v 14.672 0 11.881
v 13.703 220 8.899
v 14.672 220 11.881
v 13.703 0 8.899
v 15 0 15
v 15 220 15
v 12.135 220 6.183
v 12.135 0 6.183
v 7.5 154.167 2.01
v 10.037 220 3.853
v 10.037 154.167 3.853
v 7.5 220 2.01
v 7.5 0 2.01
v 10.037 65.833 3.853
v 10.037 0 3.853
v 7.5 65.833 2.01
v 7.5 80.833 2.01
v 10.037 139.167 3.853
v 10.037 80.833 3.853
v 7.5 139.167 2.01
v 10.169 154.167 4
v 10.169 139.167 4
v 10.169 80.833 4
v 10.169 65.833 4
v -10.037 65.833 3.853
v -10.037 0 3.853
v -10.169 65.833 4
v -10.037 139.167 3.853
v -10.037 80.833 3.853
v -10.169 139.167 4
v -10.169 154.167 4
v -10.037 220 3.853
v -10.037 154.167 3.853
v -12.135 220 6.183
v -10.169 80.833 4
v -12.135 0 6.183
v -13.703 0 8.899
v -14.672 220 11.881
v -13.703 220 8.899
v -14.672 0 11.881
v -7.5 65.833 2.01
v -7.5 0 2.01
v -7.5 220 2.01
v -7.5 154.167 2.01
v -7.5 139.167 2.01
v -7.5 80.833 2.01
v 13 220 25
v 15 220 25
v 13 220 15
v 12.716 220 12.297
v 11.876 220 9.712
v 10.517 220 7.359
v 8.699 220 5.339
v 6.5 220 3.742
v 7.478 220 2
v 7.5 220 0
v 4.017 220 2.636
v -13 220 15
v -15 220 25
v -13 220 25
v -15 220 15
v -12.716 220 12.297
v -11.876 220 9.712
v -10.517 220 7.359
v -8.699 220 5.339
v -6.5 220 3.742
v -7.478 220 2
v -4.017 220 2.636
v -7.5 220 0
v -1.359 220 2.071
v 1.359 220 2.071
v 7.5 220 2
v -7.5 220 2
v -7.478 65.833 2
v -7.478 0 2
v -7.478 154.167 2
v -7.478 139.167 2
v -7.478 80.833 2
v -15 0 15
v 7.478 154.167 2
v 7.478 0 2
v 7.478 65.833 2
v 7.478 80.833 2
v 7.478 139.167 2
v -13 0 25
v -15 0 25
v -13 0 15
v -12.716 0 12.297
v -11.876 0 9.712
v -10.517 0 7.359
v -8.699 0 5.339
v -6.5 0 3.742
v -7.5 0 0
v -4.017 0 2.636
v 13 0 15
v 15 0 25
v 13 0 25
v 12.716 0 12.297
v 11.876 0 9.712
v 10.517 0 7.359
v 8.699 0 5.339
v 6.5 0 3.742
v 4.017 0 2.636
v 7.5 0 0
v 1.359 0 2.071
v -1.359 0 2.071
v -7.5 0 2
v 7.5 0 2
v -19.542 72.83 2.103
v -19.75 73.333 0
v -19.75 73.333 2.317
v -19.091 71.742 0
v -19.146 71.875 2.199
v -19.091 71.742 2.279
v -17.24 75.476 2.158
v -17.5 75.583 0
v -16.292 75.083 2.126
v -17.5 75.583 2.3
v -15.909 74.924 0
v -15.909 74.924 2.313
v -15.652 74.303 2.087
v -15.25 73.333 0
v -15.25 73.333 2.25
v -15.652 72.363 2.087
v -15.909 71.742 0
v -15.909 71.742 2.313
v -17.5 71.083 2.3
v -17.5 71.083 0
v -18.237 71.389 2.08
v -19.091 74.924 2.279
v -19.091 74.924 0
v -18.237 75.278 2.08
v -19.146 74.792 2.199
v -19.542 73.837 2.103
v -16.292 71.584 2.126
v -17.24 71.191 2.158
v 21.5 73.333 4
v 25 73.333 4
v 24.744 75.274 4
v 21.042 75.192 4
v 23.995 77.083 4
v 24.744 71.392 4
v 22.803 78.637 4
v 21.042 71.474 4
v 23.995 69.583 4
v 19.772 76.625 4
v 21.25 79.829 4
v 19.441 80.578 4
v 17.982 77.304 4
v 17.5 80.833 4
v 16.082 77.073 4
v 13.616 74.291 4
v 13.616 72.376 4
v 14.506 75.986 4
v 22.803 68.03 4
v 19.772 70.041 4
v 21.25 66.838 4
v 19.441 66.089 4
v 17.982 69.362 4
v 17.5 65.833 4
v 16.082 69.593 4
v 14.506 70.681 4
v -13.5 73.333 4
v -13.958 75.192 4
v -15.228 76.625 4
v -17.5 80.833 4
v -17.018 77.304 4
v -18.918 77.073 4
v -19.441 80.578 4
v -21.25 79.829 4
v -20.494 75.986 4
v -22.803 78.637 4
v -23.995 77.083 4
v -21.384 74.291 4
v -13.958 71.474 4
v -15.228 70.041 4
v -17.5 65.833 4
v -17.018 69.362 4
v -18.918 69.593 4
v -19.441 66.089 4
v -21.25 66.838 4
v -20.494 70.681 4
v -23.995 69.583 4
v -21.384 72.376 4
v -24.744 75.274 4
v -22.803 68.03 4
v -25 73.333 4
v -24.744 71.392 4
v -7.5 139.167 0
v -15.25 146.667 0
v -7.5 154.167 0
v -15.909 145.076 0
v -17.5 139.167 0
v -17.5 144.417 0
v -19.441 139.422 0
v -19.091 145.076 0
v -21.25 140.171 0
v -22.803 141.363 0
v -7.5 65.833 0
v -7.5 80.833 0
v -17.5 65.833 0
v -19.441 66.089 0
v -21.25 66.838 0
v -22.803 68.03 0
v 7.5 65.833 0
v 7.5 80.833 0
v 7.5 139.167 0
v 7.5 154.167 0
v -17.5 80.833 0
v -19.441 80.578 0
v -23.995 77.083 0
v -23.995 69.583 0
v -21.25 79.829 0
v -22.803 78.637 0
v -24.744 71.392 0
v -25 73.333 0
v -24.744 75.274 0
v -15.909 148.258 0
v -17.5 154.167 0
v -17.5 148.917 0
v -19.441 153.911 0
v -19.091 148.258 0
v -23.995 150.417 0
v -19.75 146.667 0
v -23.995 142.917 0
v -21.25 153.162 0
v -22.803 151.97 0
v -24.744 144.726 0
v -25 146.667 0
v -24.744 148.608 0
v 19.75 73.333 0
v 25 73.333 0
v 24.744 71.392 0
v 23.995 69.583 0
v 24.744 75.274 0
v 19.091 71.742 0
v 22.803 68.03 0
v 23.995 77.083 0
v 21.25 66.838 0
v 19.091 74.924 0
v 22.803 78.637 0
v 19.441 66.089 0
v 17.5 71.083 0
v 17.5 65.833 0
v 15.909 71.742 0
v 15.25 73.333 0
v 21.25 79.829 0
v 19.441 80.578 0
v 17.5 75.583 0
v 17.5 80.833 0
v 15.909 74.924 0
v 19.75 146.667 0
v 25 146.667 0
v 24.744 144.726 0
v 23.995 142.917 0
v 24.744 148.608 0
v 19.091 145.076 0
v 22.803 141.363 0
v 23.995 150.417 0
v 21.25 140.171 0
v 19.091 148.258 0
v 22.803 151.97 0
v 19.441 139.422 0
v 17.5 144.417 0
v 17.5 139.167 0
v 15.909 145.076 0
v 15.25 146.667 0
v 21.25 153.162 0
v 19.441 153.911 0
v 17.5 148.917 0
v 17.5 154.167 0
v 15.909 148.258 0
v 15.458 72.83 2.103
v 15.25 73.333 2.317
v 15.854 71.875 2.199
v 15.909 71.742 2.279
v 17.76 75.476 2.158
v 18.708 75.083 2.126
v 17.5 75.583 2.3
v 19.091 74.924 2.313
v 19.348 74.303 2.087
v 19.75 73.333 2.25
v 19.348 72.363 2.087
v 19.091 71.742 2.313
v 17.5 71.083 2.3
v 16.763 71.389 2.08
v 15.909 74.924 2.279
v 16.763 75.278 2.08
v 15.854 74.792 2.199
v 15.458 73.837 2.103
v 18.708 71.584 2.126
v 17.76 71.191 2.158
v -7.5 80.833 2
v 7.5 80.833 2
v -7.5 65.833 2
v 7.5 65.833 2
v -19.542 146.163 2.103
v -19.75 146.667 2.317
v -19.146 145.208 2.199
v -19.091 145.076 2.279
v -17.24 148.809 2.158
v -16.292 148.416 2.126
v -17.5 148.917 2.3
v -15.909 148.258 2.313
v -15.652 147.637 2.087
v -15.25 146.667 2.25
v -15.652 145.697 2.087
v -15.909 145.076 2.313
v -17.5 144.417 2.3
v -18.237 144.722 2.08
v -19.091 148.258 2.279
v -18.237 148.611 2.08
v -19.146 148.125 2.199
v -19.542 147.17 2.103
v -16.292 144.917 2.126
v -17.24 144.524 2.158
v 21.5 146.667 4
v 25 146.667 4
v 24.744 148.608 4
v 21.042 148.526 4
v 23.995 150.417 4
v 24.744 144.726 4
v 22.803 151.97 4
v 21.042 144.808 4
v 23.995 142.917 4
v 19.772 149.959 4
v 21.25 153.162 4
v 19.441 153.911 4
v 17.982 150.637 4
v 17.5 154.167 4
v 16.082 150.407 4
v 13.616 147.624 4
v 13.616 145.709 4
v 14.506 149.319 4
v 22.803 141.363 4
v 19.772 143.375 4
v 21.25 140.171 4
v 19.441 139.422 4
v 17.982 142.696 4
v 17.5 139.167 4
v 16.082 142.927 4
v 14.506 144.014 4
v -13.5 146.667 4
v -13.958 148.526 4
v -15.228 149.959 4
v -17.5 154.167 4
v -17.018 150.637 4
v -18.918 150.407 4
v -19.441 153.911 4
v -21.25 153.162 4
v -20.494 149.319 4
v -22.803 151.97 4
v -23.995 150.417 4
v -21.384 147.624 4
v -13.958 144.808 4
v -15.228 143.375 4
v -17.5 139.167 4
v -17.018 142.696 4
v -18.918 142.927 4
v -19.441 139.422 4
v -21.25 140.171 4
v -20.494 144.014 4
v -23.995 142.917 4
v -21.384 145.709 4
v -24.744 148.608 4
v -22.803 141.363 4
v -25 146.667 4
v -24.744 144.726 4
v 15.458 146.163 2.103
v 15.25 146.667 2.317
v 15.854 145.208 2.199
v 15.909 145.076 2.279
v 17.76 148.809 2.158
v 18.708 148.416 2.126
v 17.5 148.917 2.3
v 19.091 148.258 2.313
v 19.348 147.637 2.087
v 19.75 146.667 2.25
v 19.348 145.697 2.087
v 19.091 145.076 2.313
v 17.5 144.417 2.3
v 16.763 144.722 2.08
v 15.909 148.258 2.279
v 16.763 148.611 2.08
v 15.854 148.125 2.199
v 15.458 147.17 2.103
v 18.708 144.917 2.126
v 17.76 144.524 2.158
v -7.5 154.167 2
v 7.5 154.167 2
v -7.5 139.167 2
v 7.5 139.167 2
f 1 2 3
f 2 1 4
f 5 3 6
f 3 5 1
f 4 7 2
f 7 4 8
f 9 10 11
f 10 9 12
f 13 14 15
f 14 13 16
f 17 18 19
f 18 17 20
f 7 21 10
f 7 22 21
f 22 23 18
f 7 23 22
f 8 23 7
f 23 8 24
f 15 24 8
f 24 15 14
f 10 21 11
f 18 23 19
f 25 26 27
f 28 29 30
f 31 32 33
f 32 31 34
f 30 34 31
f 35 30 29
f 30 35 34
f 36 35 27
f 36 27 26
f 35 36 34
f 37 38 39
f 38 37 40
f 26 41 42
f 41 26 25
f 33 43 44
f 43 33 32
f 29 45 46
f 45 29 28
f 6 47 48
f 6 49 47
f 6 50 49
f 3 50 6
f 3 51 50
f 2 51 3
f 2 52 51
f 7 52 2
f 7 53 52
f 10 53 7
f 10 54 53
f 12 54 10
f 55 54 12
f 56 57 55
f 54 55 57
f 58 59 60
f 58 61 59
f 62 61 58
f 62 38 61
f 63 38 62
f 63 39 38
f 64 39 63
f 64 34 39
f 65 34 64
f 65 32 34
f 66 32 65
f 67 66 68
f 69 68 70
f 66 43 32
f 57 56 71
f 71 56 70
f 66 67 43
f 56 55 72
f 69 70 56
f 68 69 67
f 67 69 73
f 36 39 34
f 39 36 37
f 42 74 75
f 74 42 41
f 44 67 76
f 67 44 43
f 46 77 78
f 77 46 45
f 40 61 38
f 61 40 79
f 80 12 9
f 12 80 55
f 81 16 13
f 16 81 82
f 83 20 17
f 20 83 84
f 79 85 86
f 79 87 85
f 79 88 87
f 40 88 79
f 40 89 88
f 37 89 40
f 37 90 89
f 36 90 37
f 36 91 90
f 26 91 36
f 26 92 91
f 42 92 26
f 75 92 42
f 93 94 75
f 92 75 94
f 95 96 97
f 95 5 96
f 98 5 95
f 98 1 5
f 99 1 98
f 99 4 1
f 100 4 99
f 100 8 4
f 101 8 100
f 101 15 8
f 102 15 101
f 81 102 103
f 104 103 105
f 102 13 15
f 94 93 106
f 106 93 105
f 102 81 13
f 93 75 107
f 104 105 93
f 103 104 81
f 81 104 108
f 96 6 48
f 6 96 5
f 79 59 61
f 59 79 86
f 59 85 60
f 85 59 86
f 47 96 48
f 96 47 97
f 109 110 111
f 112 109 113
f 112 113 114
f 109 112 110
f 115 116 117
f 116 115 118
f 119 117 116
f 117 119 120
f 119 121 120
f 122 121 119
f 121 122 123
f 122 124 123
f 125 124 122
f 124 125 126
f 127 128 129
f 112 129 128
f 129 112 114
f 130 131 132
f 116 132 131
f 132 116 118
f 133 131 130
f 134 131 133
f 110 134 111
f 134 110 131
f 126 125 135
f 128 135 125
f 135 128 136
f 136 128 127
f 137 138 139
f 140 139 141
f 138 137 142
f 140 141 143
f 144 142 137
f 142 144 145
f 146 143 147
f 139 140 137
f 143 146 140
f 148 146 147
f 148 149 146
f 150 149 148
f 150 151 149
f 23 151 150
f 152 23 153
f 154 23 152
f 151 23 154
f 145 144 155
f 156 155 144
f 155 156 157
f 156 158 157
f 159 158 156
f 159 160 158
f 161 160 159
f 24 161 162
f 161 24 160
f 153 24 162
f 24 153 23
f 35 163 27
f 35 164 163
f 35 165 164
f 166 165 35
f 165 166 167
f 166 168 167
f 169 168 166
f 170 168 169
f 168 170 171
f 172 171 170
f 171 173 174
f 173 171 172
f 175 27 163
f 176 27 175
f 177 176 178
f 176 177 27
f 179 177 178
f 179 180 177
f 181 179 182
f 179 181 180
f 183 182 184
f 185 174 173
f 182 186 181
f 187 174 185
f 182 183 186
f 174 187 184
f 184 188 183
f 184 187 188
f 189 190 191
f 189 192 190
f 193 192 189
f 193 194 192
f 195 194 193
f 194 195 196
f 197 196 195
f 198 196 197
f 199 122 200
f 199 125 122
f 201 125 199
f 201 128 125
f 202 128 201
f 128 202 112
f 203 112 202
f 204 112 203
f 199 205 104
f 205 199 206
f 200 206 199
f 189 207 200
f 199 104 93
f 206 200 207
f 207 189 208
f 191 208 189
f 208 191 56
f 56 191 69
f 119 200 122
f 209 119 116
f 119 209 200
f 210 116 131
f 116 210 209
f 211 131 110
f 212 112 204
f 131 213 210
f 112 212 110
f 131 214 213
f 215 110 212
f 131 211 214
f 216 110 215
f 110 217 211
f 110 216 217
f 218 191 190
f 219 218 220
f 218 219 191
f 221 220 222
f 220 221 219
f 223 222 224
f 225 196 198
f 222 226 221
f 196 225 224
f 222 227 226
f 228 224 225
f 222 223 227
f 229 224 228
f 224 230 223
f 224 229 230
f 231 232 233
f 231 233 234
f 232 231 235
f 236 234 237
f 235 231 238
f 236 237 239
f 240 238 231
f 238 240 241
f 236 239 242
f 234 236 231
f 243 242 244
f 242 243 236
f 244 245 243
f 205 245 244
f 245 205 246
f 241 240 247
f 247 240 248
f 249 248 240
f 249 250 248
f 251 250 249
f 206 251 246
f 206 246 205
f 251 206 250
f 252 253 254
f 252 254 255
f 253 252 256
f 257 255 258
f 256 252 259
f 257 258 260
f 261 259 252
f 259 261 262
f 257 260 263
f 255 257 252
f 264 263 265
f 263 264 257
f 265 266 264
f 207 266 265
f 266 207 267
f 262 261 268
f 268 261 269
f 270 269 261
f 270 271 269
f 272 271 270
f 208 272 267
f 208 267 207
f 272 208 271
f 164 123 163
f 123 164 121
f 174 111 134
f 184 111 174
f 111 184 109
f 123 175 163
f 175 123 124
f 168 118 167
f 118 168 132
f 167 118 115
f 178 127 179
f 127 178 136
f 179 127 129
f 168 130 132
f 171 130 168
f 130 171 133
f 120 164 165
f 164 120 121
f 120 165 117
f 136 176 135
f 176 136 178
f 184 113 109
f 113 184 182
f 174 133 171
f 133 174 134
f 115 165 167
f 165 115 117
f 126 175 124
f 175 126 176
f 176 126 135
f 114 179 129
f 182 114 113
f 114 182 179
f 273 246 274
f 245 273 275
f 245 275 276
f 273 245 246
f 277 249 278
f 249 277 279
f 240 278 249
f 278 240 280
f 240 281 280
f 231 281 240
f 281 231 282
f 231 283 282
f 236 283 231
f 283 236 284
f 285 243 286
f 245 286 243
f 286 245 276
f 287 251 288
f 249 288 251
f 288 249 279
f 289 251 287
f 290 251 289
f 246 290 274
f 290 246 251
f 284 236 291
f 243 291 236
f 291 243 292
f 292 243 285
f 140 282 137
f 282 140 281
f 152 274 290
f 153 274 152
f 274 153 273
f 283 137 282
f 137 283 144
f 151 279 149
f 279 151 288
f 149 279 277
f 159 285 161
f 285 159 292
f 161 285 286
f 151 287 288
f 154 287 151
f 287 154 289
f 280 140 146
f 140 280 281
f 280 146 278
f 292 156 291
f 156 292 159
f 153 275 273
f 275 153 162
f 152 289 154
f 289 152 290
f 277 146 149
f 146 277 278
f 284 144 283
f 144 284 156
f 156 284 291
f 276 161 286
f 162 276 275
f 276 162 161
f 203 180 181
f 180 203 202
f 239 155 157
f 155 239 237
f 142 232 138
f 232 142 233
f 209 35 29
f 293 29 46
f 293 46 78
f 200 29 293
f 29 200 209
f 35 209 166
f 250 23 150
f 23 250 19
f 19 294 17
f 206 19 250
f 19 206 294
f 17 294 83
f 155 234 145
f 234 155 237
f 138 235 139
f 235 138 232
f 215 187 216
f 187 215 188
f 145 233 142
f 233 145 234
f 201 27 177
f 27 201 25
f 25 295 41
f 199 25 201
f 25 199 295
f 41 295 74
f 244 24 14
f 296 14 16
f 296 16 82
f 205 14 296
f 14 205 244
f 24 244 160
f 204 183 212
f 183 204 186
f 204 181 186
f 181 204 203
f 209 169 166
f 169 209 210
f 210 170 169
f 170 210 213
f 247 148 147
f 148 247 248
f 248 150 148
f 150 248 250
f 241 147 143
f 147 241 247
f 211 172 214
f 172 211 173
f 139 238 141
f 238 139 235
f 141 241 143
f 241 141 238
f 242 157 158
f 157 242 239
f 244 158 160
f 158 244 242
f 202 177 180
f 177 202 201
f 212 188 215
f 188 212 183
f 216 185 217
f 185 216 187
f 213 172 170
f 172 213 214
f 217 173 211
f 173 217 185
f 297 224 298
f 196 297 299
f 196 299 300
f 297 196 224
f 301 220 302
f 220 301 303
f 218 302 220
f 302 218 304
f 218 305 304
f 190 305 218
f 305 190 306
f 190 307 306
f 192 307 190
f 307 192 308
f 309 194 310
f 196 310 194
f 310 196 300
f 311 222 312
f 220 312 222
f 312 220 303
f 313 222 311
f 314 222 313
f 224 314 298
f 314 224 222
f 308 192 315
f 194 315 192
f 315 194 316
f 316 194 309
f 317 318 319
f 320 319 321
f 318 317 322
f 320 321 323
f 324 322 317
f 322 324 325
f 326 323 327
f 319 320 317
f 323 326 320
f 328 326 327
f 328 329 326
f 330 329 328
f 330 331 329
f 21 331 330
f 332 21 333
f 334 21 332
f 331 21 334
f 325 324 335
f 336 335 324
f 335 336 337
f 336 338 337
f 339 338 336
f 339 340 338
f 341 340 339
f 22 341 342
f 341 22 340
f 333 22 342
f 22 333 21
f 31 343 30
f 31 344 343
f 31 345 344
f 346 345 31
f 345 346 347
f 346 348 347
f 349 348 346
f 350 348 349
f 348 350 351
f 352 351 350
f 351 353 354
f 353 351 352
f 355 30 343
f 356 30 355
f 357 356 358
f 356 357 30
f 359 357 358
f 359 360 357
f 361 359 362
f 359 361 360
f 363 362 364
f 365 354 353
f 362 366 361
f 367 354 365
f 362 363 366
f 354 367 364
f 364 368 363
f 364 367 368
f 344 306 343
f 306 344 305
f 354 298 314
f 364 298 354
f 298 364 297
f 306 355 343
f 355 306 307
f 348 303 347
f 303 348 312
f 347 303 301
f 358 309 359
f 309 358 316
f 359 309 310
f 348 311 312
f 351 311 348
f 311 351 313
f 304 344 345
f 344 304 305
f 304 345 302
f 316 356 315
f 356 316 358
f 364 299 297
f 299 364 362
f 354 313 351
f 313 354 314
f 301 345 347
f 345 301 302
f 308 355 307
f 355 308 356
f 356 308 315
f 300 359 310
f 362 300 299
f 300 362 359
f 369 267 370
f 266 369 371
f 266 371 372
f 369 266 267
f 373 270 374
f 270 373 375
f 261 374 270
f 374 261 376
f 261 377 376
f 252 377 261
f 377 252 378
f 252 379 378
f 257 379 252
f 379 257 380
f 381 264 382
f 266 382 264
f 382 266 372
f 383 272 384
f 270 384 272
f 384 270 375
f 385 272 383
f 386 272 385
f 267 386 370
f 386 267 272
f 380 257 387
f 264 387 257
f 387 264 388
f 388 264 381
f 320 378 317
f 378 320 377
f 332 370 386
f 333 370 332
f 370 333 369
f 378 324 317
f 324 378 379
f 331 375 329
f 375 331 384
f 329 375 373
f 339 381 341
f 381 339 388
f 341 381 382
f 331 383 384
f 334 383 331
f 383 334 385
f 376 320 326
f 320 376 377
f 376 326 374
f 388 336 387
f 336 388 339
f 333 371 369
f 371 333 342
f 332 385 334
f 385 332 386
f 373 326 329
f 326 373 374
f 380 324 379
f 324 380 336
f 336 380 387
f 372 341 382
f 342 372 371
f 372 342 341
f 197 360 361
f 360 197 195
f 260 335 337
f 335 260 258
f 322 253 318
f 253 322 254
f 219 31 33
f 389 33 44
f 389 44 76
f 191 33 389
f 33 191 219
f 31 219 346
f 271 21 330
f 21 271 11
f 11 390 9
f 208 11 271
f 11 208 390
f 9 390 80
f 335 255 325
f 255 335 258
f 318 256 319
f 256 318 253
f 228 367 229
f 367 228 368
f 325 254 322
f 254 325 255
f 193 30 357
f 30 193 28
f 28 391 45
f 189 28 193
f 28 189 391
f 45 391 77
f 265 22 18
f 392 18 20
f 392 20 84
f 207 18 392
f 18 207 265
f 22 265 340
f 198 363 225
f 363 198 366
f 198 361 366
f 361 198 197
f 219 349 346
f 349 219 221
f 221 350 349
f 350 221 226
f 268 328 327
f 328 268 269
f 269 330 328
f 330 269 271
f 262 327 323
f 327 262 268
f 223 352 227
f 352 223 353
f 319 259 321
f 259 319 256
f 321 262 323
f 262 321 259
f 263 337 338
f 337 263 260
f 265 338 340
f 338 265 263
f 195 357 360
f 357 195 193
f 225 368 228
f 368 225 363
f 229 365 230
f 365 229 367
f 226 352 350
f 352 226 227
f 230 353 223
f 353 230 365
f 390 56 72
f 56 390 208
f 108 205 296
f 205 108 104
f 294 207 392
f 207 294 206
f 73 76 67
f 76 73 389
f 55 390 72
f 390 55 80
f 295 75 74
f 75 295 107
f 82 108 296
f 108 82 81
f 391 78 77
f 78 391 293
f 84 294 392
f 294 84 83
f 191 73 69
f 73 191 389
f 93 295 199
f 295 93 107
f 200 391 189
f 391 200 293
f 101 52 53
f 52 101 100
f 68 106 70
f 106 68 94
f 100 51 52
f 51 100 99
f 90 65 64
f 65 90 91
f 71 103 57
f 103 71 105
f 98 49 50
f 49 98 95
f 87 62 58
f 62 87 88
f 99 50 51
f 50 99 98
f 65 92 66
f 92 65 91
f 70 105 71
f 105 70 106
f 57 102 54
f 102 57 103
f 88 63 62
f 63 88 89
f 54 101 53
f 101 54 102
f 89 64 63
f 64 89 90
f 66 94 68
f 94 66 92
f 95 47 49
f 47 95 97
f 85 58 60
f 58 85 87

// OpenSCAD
l_trough = 220;
d_trough = 30;
h_trough = 25;
cl_h_trough = 0;
thk_trough = 2;
w_base = 15;
thk_base = 2;
thk_feet = 4;
screw_hole_dia = 4.5;
csk_depth = 4;
csk_dia = 8;
feet_centres = d_trough+ 5;
d_feet = 15;

//trough

{
    // trough
    difference()
    {
        union()
        {
        // trough outer
            translate([0,0,d_trough/2+cl_h_trough])
            rotate([-90,0,0])
            {
            cylinder(d=d_trough,h=l_trough);
                translate([-d_trough/2,-(h_trough-d_trough/2),0]) // 
                    cube([d_trough,h_trough-d_trough/2,l_trough]);
            }
            
            // base cube
            translate([-w_base/2,0,0])
            cube([w_base,l_trough,thk_base]);
            // feet
            translate([0,l_trough/3,0])
            foot();
            translate([0,2*l_trough/3,0])
            foot();
        }
        
        //inner trough cutout
        id = d_trough-2*thk_trough;
        translate([0,0,d_trough/2+cl_h_trough])
        rotate([-90,0,0])
        {
            cylinder(d=id,h=l_trough);
                   translate([-id/2,-(h_trough),0]) // 
                        cube([id,h_trough,l_trough]);
        }

    }
    // trough sides
    



}





module foot()
    {
        translate([-feet_centres/2,0,0])
        {
    difference()
    {
        //rounded foot shape
        hull()
        {
            cylinder(d=d_feet,h=thk_feet);
            translate([feet_centres,0,0])    
            cylinder(d=d_feet,h=thk_feet);
        }
        //screw hole and countersinks
        translate([0,0,thk_feet])
            csk_screw_hole(screw_hole_dia,thk_feet,csk_dia,csk_depth);
        translate([feet_centres,0,thk_feet])
            csk_screw_hole(screw_hole_dia,thk_feet,csk_dia,csk_depth);
    }
}
    
    }    
    
module csk_screw_hole(screw_dia, screw_depth, csk_dia, csk_depth)
{
    translate([0,0,-screw_depth])
        cylinder(d=screw_dia,h=screw_depth);
    
    translate([0,0,-csk_depth])
//        cylinder(d1=screw_dia,d2=csk_dia,csk_depth);
        cylinder(d1=0,d2=csk_dia,csk_depth);
}
